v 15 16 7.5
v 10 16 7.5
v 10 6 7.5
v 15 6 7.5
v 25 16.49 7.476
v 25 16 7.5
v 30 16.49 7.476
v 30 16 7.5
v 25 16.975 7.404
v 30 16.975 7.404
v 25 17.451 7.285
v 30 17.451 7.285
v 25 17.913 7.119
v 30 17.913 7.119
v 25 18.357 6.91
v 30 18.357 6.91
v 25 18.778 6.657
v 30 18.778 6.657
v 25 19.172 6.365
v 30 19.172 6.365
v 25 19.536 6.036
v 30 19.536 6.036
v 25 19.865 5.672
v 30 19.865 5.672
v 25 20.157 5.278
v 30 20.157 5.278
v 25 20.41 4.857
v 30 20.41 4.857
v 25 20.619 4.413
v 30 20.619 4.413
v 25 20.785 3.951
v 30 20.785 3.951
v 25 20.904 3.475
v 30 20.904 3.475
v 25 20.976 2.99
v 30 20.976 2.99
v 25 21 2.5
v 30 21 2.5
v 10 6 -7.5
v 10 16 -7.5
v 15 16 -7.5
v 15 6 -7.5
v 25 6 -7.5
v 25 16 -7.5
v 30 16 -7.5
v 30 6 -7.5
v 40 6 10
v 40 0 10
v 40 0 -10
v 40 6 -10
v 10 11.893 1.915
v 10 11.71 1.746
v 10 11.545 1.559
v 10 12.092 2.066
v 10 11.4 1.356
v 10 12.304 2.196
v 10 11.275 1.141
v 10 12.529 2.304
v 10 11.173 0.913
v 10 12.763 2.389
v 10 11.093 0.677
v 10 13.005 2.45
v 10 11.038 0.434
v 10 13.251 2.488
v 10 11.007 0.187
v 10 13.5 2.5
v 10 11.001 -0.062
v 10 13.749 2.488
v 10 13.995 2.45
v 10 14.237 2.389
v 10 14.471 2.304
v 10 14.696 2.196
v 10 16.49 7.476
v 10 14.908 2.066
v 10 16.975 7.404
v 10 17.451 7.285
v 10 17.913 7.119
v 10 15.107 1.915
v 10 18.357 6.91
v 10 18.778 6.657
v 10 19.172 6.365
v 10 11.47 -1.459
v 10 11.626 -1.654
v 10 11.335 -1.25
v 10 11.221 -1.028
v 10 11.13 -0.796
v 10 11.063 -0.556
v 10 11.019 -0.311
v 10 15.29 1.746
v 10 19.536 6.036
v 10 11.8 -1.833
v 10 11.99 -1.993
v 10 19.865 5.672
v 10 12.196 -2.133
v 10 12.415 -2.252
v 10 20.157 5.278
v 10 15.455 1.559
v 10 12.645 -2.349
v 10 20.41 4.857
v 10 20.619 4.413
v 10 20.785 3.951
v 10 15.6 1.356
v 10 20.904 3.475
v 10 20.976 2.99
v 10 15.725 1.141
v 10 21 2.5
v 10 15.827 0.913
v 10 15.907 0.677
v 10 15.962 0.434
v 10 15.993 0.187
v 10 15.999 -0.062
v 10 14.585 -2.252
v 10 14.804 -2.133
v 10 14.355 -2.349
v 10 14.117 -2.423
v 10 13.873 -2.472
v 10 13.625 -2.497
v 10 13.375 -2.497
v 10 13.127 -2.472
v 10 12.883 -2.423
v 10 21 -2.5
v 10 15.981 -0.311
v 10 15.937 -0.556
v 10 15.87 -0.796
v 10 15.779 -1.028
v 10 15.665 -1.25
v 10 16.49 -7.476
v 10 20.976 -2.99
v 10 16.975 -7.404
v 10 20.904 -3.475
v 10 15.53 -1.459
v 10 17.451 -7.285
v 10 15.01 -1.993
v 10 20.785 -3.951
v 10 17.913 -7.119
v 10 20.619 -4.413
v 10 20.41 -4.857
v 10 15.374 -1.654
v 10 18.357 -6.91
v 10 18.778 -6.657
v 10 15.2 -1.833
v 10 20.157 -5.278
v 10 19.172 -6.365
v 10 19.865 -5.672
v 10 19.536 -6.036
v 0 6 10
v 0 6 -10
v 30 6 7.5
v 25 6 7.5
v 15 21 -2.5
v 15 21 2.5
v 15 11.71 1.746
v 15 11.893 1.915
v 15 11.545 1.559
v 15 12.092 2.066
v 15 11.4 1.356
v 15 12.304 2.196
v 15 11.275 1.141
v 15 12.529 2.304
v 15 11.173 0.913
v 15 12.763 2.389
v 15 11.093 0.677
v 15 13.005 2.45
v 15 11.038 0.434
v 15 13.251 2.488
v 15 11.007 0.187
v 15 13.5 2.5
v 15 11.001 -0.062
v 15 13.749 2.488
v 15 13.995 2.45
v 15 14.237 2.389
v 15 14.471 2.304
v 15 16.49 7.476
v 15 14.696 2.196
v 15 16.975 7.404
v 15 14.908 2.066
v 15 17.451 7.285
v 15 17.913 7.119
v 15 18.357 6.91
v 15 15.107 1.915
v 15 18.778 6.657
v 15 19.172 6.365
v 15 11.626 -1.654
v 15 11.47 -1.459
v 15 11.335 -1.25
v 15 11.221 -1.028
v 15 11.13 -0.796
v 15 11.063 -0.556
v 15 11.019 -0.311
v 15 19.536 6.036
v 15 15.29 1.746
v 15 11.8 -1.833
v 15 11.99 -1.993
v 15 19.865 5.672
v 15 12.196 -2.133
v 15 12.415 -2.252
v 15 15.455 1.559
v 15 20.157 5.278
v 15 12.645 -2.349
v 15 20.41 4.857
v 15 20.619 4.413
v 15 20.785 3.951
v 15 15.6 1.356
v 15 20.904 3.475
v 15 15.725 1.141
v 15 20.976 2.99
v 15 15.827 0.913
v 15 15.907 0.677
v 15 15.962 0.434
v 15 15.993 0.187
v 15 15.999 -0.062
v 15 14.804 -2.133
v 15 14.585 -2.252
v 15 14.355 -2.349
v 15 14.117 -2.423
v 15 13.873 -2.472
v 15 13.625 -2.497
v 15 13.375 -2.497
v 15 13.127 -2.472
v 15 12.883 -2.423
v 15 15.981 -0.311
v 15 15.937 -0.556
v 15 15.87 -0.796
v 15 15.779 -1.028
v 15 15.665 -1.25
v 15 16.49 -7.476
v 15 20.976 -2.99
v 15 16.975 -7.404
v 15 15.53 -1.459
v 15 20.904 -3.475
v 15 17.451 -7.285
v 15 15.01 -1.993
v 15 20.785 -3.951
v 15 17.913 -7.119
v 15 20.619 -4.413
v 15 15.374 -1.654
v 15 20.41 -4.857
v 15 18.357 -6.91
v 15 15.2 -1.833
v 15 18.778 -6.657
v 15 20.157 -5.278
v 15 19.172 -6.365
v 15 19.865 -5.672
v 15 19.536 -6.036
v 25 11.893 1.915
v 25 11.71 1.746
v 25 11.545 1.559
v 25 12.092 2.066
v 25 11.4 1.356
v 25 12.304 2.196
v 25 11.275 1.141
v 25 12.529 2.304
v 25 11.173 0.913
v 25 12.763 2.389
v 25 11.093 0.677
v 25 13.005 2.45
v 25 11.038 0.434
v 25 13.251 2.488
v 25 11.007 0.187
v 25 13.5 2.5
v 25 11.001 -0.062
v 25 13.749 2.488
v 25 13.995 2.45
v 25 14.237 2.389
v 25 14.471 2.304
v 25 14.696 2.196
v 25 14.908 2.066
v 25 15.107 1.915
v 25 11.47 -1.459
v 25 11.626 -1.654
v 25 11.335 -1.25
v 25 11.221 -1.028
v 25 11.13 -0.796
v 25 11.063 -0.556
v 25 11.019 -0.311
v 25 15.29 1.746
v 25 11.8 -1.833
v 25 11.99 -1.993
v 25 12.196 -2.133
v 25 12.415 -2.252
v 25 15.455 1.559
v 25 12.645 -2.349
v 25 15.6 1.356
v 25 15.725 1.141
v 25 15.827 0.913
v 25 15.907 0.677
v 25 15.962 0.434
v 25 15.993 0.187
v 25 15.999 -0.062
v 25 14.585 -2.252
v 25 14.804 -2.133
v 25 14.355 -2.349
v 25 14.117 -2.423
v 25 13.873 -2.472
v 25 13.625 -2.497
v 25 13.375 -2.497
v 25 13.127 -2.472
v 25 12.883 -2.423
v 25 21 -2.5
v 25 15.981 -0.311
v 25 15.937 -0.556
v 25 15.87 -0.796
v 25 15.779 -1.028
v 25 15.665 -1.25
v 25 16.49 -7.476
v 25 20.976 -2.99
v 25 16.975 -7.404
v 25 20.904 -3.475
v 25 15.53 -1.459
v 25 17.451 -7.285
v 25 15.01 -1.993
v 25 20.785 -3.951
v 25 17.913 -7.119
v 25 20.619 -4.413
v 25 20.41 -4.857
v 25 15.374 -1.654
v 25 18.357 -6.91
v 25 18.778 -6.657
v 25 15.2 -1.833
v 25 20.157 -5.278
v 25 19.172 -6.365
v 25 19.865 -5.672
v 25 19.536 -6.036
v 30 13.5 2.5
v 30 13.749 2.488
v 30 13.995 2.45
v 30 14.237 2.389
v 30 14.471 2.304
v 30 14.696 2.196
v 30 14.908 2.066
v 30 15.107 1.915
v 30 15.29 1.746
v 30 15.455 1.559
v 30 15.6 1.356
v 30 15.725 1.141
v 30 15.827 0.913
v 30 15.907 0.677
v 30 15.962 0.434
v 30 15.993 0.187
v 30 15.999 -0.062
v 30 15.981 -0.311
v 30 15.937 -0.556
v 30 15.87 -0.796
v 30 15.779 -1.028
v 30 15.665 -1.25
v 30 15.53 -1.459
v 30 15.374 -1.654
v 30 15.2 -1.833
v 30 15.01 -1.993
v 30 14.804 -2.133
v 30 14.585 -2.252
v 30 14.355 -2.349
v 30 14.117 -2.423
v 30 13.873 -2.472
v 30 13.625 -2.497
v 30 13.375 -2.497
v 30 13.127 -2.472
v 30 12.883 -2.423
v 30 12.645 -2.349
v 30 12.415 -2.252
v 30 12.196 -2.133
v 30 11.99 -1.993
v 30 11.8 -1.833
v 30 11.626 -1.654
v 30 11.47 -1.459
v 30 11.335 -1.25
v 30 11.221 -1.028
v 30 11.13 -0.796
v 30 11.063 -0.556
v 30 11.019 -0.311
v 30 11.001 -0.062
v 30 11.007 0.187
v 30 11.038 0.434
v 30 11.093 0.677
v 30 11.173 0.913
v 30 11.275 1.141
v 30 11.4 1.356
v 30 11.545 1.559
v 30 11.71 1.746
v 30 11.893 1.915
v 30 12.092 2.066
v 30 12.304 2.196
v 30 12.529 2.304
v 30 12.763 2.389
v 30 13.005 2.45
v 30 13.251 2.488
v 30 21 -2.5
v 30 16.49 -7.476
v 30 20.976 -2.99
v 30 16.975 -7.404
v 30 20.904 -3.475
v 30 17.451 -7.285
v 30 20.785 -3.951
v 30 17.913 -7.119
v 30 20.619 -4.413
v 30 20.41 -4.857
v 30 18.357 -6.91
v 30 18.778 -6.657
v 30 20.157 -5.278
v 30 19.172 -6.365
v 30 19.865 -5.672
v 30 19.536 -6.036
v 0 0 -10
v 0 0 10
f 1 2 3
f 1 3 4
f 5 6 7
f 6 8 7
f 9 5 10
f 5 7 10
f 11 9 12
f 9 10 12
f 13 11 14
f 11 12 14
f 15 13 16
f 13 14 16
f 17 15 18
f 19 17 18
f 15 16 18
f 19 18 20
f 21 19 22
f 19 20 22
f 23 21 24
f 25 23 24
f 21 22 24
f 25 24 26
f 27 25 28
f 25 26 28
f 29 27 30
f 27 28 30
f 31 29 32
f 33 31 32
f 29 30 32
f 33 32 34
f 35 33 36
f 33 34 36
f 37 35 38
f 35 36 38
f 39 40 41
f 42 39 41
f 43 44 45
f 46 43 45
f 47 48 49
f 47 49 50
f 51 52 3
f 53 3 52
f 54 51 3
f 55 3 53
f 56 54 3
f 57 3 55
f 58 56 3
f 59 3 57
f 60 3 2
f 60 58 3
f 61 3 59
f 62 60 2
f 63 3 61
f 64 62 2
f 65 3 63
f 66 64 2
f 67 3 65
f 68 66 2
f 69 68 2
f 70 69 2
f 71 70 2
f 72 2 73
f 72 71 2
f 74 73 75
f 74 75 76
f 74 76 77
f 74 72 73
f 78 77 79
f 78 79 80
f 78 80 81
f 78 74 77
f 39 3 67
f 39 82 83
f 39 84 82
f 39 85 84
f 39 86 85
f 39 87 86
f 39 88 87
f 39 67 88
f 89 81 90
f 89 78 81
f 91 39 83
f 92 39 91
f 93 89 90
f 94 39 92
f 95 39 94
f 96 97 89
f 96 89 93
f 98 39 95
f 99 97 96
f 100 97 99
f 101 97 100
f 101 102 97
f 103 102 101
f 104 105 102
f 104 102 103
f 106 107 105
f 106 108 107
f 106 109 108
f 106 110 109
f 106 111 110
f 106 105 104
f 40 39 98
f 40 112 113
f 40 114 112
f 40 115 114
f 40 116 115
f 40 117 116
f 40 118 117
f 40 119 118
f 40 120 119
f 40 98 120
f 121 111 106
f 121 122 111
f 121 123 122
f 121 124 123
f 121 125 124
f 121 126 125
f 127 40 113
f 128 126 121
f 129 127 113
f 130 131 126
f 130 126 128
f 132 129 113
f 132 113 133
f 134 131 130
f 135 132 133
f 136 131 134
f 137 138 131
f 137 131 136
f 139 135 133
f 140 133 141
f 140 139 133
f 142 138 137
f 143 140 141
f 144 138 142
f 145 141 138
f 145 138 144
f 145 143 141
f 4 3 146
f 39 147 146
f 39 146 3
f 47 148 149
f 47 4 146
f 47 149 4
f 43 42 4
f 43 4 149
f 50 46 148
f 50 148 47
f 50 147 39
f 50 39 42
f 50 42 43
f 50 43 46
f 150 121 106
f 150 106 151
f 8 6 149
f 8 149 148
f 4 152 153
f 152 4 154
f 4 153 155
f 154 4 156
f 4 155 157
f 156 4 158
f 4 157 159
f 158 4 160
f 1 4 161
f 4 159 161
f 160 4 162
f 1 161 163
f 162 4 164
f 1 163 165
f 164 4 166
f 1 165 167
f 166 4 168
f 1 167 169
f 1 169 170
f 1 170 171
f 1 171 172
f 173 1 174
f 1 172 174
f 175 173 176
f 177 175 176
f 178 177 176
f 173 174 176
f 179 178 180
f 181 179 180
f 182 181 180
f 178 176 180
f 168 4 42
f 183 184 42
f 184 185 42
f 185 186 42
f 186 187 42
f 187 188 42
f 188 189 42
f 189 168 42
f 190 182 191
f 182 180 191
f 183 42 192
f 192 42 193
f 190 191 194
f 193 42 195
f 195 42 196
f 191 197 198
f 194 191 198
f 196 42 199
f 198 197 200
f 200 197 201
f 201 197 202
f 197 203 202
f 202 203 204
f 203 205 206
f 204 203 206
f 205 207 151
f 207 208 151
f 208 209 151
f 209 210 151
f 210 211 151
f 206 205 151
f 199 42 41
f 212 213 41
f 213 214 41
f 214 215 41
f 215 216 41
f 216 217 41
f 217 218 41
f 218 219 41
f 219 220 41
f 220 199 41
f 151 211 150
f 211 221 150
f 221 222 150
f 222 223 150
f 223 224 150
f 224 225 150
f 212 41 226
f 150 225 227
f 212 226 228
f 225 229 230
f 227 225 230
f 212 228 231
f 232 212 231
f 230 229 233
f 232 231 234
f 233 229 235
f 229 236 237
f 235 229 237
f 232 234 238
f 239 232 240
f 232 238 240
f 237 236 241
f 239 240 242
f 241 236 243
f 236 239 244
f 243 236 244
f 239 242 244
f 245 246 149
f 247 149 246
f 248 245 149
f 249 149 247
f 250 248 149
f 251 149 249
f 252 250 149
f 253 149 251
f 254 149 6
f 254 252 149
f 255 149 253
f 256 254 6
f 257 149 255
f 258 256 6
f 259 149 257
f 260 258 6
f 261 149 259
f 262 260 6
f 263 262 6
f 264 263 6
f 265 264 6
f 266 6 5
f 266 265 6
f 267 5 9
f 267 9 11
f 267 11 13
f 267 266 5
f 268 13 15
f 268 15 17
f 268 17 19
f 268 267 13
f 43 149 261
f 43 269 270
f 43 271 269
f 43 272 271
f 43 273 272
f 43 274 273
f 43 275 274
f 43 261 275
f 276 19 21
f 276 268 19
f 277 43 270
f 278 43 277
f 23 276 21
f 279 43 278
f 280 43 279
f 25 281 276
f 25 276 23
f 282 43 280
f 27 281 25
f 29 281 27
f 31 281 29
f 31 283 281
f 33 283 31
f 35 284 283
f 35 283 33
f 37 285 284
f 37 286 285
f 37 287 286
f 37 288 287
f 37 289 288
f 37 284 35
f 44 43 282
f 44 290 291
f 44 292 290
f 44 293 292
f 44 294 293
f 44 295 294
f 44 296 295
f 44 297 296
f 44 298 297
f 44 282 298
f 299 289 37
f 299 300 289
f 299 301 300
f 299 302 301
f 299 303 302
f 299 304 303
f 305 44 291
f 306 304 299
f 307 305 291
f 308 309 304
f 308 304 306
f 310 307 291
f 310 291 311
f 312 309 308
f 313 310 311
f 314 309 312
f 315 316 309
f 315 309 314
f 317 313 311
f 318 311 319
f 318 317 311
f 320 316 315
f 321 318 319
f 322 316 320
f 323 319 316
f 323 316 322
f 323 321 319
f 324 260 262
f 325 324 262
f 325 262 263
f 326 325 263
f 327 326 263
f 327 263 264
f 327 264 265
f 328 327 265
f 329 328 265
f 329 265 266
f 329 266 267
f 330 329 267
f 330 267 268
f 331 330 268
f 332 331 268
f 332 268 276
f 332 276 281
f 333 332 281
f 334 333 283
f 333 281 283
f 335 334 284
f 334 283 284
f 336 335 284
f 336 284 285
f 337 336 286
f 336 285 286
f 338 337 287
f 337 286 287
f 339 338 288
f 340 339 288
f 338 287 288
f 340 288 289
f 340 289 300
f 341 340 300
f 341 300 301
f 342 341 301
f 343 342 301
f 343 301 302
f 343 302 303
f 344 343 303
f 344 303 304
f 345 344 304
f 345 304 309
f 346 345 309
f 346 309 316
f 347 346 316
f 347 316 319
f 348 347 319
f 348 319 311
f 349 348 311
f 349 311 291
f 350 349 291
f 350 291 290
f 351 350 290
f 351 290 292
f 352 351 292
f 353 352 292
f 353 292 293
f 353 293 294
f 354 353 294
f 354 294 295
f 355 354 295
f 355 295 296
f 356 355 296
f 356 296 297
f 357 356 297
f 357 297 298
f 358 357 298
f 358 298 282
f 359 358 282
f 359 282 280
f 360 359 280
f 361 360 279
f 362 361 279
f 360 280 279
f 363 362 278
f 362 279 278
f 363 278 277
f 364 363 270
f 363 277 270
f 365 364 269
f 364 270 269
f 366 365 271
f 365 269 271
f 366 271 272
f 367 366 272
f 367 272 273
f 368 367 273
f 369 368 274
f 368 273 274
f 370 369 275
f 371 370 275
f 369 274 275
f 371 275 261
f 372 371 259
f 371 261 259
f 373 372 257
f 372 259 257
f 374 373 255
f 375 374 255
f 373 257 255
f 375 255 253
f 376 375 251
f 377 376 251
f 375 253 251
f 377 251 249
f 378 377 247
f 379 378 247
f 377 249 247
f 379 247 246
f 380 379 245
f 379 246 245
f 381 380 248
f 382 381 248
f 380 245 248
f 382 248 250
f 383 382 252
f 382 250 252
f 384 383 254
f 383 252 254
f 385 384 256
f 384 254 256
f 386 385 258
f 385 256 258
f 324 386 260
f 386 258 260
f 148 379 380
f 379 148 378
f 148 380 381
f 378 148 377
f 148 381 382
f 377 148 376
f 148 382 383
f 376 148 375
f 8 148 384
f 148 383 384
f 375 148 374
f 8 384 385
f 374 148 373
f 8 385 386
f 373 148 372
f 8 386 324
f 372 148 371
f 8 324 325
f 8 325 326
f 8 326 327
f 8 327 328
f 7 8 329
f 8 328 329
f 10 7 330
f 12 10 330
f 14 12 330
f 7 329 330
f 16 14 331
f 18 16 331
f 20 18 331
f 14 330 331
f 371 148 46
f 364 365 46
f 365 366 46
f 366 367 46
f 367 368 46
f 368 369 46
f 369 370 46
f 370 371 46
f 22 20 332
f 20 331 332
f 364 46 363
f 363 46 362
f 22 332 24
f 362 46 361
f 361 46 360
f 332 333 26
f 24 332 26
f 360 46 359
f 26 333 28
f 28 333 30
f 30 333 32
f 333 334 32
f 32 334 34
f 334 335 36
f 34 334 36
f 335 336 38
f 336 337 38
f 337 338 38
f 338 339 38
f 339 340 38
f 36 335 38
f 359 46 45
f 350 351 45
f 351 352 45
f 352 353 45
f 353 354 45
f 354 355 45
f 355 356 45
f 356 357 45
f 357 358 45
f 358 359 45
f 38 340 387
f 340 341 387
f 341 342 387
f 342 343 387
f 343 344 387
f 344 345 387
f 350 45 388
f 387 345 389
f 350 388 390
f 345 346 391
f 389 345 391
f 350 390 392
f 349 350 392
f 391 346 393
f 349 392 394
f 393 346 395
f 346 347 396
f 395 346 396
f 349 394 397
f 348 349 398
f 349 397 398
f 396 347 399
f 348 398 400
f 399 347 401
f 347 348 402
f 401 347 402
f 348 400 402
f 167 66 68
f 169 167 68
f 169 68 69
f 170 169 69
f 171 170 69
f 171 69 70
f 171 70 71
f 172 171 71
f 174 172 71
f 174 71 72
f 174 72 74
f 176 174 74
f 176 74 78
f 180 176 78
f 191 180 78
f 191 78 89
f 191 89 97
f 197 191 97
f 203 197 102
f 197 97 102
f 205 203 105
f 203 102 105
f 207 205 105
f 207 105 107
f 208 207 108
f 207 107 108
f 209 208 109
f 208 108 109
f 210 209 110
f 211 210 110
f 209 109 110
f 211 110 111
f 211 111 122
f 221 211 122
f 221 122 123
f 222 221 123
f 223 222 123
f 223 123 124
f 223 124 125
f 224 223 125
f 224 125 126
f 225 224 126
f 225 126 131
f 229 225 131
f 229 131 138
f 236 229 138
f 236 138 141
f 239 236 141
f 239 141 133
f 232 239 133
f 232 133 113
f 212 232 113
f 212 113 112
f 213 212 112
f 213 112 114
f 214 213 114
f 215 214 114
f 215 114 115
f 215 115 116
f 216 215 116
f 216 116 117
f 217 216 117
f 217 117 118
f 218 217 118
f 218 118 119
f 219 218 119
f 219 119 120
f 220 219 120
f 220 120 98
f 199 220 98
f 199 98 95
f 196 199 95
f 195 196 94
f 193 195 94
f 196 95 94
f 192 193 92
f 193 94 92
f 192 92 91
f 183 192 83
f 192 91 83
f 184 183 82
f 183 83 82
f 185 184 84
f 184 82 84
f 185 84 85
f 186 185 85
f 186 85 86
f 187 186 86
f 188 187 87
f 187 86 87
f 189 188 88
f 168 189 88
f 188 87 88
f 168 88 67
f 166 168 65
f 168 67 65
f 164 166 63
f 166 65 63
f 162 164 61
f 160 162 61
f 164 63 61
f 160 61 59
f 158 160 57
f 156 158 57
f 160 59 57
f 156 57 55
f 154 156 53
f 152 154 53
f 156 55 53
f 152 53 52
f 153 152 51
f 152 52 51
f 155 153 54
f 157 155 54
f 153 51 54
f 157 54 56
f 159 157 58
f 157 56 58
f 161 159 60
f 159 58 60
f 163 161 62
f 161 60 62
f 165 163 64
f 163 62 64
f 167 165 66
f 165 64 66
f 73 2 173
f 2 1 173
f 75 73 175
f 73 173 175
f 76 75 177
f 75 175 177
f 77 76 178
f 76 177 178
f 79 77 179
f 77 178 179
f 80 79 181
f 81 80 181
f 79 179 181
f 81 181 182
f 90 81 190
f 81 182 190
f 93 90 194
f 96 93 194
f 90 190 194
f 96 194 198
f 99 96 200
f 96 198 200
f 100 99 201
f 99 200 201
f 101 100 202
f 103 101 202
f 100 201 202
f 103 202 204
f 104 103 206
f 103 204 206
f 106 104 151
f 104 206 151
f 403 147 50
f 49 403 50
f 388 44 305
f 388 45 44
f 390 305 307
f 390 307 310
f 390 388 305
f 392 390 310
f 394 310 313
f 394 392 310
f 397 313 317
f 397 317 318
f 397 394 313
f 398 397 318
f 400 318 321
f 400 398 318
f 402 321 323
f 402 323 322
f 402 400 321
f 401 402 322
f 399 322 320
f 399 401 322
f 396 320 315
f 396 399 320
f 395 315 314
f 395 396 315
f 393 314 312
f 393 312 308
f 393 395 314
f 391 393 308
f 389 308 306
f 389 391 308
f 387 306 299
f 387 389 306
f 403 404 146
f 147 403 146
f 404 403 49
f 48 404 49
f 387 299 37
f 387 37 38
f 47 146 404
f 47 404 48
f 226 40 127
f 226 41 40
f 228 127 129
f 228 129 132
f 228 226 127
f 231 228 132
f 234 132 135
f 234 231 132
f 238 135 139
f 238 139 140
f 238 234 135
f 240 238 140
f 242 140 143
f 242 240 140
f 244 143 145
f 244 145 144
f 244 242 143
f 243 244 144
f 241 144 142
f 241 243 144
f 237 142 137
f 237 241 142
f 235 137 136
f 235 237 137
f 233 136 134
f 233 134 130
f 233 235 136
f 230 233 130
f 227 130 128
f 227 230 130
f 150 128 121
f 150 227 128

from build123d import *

# Parameters (mm, degrees)
BOSS_EXTRUDE1_DEPTH      = 10
BOSS_EXTRUDE1_DEPTH_BACK = 10
BOSS_EXTRUDE2_DEPTH      = 7.5
BOSS_EXTRUDE2_DEPTH_BACK = 7.5
SKETCH1_4_W              = 5
SKETCH1_4_H              = 15
SKETCH2_R                = 2.5
CUT_EXTRUDE1_DEPTH       = 38.960505792
FILLET1_R                = 5


with BuildPart() as part:
    # Sketch1 → Boss-Extrude1 (new, two sides: drawn at the far end of the back side and taken through both)
    with BuildSketch(Plane.XY.offset(-BOSS_EXTRUDE1_DEPTH_BACK)):
        Polygon((0, 6), (0, 0), (40, 0), (40, 6), (30, 6), (25, 6), (15, 6), (10, 6), align=None)
    extrude(amount=BOSS_EXTRUDE1_DEPTH + BOSS_EXTRUDE1_DEPTH_BACK)

    # Sketch1<4> → Boss-Extrude2 (add, two sides: drawn at the far end of the back side and taken through both)
    with BuildSketch(Plane.XY.offset(-BOSS_EXTRUDE2_DEPTH_BACK)):
        with Locations((12.5, 13.5)):
            Rectangle(SKETCH1_4_W, SKETCH1_4_H)
        with Locations((27.5, 13.5)):
            Rectangle(SKETCH1_4_W, SKETCH1_4_H)
    extrude(amount=BOSS_EXTRUDE2_DEPTH + BOSS_EXTRUDE2_DEPTH_BACK)

    # Sketch2 → Cut-Extrude1 (cut, through all)
    with BuildSketch(Plane.ZY.offset(-10)):
        with Locations((0, 13.5)):
            Circle(SKETCH2_R)
    extrude(amount=-CUT_EXTRUDE1_DEPTH, mode=Mode.SUBTRACT)

    # Fillet1
    fillet1_edges = [part.edges().sort_by_distance(p)[0] for p in [
        (12.5, 21, -7.5),
        (27.5, 21, -7.5),
        (27.5, 21, 7.5),
        (12.5, 21, 7.5),
    ]]
    fillet(fillet1_edges, radius=FILLET1_R)


solid = part.part
